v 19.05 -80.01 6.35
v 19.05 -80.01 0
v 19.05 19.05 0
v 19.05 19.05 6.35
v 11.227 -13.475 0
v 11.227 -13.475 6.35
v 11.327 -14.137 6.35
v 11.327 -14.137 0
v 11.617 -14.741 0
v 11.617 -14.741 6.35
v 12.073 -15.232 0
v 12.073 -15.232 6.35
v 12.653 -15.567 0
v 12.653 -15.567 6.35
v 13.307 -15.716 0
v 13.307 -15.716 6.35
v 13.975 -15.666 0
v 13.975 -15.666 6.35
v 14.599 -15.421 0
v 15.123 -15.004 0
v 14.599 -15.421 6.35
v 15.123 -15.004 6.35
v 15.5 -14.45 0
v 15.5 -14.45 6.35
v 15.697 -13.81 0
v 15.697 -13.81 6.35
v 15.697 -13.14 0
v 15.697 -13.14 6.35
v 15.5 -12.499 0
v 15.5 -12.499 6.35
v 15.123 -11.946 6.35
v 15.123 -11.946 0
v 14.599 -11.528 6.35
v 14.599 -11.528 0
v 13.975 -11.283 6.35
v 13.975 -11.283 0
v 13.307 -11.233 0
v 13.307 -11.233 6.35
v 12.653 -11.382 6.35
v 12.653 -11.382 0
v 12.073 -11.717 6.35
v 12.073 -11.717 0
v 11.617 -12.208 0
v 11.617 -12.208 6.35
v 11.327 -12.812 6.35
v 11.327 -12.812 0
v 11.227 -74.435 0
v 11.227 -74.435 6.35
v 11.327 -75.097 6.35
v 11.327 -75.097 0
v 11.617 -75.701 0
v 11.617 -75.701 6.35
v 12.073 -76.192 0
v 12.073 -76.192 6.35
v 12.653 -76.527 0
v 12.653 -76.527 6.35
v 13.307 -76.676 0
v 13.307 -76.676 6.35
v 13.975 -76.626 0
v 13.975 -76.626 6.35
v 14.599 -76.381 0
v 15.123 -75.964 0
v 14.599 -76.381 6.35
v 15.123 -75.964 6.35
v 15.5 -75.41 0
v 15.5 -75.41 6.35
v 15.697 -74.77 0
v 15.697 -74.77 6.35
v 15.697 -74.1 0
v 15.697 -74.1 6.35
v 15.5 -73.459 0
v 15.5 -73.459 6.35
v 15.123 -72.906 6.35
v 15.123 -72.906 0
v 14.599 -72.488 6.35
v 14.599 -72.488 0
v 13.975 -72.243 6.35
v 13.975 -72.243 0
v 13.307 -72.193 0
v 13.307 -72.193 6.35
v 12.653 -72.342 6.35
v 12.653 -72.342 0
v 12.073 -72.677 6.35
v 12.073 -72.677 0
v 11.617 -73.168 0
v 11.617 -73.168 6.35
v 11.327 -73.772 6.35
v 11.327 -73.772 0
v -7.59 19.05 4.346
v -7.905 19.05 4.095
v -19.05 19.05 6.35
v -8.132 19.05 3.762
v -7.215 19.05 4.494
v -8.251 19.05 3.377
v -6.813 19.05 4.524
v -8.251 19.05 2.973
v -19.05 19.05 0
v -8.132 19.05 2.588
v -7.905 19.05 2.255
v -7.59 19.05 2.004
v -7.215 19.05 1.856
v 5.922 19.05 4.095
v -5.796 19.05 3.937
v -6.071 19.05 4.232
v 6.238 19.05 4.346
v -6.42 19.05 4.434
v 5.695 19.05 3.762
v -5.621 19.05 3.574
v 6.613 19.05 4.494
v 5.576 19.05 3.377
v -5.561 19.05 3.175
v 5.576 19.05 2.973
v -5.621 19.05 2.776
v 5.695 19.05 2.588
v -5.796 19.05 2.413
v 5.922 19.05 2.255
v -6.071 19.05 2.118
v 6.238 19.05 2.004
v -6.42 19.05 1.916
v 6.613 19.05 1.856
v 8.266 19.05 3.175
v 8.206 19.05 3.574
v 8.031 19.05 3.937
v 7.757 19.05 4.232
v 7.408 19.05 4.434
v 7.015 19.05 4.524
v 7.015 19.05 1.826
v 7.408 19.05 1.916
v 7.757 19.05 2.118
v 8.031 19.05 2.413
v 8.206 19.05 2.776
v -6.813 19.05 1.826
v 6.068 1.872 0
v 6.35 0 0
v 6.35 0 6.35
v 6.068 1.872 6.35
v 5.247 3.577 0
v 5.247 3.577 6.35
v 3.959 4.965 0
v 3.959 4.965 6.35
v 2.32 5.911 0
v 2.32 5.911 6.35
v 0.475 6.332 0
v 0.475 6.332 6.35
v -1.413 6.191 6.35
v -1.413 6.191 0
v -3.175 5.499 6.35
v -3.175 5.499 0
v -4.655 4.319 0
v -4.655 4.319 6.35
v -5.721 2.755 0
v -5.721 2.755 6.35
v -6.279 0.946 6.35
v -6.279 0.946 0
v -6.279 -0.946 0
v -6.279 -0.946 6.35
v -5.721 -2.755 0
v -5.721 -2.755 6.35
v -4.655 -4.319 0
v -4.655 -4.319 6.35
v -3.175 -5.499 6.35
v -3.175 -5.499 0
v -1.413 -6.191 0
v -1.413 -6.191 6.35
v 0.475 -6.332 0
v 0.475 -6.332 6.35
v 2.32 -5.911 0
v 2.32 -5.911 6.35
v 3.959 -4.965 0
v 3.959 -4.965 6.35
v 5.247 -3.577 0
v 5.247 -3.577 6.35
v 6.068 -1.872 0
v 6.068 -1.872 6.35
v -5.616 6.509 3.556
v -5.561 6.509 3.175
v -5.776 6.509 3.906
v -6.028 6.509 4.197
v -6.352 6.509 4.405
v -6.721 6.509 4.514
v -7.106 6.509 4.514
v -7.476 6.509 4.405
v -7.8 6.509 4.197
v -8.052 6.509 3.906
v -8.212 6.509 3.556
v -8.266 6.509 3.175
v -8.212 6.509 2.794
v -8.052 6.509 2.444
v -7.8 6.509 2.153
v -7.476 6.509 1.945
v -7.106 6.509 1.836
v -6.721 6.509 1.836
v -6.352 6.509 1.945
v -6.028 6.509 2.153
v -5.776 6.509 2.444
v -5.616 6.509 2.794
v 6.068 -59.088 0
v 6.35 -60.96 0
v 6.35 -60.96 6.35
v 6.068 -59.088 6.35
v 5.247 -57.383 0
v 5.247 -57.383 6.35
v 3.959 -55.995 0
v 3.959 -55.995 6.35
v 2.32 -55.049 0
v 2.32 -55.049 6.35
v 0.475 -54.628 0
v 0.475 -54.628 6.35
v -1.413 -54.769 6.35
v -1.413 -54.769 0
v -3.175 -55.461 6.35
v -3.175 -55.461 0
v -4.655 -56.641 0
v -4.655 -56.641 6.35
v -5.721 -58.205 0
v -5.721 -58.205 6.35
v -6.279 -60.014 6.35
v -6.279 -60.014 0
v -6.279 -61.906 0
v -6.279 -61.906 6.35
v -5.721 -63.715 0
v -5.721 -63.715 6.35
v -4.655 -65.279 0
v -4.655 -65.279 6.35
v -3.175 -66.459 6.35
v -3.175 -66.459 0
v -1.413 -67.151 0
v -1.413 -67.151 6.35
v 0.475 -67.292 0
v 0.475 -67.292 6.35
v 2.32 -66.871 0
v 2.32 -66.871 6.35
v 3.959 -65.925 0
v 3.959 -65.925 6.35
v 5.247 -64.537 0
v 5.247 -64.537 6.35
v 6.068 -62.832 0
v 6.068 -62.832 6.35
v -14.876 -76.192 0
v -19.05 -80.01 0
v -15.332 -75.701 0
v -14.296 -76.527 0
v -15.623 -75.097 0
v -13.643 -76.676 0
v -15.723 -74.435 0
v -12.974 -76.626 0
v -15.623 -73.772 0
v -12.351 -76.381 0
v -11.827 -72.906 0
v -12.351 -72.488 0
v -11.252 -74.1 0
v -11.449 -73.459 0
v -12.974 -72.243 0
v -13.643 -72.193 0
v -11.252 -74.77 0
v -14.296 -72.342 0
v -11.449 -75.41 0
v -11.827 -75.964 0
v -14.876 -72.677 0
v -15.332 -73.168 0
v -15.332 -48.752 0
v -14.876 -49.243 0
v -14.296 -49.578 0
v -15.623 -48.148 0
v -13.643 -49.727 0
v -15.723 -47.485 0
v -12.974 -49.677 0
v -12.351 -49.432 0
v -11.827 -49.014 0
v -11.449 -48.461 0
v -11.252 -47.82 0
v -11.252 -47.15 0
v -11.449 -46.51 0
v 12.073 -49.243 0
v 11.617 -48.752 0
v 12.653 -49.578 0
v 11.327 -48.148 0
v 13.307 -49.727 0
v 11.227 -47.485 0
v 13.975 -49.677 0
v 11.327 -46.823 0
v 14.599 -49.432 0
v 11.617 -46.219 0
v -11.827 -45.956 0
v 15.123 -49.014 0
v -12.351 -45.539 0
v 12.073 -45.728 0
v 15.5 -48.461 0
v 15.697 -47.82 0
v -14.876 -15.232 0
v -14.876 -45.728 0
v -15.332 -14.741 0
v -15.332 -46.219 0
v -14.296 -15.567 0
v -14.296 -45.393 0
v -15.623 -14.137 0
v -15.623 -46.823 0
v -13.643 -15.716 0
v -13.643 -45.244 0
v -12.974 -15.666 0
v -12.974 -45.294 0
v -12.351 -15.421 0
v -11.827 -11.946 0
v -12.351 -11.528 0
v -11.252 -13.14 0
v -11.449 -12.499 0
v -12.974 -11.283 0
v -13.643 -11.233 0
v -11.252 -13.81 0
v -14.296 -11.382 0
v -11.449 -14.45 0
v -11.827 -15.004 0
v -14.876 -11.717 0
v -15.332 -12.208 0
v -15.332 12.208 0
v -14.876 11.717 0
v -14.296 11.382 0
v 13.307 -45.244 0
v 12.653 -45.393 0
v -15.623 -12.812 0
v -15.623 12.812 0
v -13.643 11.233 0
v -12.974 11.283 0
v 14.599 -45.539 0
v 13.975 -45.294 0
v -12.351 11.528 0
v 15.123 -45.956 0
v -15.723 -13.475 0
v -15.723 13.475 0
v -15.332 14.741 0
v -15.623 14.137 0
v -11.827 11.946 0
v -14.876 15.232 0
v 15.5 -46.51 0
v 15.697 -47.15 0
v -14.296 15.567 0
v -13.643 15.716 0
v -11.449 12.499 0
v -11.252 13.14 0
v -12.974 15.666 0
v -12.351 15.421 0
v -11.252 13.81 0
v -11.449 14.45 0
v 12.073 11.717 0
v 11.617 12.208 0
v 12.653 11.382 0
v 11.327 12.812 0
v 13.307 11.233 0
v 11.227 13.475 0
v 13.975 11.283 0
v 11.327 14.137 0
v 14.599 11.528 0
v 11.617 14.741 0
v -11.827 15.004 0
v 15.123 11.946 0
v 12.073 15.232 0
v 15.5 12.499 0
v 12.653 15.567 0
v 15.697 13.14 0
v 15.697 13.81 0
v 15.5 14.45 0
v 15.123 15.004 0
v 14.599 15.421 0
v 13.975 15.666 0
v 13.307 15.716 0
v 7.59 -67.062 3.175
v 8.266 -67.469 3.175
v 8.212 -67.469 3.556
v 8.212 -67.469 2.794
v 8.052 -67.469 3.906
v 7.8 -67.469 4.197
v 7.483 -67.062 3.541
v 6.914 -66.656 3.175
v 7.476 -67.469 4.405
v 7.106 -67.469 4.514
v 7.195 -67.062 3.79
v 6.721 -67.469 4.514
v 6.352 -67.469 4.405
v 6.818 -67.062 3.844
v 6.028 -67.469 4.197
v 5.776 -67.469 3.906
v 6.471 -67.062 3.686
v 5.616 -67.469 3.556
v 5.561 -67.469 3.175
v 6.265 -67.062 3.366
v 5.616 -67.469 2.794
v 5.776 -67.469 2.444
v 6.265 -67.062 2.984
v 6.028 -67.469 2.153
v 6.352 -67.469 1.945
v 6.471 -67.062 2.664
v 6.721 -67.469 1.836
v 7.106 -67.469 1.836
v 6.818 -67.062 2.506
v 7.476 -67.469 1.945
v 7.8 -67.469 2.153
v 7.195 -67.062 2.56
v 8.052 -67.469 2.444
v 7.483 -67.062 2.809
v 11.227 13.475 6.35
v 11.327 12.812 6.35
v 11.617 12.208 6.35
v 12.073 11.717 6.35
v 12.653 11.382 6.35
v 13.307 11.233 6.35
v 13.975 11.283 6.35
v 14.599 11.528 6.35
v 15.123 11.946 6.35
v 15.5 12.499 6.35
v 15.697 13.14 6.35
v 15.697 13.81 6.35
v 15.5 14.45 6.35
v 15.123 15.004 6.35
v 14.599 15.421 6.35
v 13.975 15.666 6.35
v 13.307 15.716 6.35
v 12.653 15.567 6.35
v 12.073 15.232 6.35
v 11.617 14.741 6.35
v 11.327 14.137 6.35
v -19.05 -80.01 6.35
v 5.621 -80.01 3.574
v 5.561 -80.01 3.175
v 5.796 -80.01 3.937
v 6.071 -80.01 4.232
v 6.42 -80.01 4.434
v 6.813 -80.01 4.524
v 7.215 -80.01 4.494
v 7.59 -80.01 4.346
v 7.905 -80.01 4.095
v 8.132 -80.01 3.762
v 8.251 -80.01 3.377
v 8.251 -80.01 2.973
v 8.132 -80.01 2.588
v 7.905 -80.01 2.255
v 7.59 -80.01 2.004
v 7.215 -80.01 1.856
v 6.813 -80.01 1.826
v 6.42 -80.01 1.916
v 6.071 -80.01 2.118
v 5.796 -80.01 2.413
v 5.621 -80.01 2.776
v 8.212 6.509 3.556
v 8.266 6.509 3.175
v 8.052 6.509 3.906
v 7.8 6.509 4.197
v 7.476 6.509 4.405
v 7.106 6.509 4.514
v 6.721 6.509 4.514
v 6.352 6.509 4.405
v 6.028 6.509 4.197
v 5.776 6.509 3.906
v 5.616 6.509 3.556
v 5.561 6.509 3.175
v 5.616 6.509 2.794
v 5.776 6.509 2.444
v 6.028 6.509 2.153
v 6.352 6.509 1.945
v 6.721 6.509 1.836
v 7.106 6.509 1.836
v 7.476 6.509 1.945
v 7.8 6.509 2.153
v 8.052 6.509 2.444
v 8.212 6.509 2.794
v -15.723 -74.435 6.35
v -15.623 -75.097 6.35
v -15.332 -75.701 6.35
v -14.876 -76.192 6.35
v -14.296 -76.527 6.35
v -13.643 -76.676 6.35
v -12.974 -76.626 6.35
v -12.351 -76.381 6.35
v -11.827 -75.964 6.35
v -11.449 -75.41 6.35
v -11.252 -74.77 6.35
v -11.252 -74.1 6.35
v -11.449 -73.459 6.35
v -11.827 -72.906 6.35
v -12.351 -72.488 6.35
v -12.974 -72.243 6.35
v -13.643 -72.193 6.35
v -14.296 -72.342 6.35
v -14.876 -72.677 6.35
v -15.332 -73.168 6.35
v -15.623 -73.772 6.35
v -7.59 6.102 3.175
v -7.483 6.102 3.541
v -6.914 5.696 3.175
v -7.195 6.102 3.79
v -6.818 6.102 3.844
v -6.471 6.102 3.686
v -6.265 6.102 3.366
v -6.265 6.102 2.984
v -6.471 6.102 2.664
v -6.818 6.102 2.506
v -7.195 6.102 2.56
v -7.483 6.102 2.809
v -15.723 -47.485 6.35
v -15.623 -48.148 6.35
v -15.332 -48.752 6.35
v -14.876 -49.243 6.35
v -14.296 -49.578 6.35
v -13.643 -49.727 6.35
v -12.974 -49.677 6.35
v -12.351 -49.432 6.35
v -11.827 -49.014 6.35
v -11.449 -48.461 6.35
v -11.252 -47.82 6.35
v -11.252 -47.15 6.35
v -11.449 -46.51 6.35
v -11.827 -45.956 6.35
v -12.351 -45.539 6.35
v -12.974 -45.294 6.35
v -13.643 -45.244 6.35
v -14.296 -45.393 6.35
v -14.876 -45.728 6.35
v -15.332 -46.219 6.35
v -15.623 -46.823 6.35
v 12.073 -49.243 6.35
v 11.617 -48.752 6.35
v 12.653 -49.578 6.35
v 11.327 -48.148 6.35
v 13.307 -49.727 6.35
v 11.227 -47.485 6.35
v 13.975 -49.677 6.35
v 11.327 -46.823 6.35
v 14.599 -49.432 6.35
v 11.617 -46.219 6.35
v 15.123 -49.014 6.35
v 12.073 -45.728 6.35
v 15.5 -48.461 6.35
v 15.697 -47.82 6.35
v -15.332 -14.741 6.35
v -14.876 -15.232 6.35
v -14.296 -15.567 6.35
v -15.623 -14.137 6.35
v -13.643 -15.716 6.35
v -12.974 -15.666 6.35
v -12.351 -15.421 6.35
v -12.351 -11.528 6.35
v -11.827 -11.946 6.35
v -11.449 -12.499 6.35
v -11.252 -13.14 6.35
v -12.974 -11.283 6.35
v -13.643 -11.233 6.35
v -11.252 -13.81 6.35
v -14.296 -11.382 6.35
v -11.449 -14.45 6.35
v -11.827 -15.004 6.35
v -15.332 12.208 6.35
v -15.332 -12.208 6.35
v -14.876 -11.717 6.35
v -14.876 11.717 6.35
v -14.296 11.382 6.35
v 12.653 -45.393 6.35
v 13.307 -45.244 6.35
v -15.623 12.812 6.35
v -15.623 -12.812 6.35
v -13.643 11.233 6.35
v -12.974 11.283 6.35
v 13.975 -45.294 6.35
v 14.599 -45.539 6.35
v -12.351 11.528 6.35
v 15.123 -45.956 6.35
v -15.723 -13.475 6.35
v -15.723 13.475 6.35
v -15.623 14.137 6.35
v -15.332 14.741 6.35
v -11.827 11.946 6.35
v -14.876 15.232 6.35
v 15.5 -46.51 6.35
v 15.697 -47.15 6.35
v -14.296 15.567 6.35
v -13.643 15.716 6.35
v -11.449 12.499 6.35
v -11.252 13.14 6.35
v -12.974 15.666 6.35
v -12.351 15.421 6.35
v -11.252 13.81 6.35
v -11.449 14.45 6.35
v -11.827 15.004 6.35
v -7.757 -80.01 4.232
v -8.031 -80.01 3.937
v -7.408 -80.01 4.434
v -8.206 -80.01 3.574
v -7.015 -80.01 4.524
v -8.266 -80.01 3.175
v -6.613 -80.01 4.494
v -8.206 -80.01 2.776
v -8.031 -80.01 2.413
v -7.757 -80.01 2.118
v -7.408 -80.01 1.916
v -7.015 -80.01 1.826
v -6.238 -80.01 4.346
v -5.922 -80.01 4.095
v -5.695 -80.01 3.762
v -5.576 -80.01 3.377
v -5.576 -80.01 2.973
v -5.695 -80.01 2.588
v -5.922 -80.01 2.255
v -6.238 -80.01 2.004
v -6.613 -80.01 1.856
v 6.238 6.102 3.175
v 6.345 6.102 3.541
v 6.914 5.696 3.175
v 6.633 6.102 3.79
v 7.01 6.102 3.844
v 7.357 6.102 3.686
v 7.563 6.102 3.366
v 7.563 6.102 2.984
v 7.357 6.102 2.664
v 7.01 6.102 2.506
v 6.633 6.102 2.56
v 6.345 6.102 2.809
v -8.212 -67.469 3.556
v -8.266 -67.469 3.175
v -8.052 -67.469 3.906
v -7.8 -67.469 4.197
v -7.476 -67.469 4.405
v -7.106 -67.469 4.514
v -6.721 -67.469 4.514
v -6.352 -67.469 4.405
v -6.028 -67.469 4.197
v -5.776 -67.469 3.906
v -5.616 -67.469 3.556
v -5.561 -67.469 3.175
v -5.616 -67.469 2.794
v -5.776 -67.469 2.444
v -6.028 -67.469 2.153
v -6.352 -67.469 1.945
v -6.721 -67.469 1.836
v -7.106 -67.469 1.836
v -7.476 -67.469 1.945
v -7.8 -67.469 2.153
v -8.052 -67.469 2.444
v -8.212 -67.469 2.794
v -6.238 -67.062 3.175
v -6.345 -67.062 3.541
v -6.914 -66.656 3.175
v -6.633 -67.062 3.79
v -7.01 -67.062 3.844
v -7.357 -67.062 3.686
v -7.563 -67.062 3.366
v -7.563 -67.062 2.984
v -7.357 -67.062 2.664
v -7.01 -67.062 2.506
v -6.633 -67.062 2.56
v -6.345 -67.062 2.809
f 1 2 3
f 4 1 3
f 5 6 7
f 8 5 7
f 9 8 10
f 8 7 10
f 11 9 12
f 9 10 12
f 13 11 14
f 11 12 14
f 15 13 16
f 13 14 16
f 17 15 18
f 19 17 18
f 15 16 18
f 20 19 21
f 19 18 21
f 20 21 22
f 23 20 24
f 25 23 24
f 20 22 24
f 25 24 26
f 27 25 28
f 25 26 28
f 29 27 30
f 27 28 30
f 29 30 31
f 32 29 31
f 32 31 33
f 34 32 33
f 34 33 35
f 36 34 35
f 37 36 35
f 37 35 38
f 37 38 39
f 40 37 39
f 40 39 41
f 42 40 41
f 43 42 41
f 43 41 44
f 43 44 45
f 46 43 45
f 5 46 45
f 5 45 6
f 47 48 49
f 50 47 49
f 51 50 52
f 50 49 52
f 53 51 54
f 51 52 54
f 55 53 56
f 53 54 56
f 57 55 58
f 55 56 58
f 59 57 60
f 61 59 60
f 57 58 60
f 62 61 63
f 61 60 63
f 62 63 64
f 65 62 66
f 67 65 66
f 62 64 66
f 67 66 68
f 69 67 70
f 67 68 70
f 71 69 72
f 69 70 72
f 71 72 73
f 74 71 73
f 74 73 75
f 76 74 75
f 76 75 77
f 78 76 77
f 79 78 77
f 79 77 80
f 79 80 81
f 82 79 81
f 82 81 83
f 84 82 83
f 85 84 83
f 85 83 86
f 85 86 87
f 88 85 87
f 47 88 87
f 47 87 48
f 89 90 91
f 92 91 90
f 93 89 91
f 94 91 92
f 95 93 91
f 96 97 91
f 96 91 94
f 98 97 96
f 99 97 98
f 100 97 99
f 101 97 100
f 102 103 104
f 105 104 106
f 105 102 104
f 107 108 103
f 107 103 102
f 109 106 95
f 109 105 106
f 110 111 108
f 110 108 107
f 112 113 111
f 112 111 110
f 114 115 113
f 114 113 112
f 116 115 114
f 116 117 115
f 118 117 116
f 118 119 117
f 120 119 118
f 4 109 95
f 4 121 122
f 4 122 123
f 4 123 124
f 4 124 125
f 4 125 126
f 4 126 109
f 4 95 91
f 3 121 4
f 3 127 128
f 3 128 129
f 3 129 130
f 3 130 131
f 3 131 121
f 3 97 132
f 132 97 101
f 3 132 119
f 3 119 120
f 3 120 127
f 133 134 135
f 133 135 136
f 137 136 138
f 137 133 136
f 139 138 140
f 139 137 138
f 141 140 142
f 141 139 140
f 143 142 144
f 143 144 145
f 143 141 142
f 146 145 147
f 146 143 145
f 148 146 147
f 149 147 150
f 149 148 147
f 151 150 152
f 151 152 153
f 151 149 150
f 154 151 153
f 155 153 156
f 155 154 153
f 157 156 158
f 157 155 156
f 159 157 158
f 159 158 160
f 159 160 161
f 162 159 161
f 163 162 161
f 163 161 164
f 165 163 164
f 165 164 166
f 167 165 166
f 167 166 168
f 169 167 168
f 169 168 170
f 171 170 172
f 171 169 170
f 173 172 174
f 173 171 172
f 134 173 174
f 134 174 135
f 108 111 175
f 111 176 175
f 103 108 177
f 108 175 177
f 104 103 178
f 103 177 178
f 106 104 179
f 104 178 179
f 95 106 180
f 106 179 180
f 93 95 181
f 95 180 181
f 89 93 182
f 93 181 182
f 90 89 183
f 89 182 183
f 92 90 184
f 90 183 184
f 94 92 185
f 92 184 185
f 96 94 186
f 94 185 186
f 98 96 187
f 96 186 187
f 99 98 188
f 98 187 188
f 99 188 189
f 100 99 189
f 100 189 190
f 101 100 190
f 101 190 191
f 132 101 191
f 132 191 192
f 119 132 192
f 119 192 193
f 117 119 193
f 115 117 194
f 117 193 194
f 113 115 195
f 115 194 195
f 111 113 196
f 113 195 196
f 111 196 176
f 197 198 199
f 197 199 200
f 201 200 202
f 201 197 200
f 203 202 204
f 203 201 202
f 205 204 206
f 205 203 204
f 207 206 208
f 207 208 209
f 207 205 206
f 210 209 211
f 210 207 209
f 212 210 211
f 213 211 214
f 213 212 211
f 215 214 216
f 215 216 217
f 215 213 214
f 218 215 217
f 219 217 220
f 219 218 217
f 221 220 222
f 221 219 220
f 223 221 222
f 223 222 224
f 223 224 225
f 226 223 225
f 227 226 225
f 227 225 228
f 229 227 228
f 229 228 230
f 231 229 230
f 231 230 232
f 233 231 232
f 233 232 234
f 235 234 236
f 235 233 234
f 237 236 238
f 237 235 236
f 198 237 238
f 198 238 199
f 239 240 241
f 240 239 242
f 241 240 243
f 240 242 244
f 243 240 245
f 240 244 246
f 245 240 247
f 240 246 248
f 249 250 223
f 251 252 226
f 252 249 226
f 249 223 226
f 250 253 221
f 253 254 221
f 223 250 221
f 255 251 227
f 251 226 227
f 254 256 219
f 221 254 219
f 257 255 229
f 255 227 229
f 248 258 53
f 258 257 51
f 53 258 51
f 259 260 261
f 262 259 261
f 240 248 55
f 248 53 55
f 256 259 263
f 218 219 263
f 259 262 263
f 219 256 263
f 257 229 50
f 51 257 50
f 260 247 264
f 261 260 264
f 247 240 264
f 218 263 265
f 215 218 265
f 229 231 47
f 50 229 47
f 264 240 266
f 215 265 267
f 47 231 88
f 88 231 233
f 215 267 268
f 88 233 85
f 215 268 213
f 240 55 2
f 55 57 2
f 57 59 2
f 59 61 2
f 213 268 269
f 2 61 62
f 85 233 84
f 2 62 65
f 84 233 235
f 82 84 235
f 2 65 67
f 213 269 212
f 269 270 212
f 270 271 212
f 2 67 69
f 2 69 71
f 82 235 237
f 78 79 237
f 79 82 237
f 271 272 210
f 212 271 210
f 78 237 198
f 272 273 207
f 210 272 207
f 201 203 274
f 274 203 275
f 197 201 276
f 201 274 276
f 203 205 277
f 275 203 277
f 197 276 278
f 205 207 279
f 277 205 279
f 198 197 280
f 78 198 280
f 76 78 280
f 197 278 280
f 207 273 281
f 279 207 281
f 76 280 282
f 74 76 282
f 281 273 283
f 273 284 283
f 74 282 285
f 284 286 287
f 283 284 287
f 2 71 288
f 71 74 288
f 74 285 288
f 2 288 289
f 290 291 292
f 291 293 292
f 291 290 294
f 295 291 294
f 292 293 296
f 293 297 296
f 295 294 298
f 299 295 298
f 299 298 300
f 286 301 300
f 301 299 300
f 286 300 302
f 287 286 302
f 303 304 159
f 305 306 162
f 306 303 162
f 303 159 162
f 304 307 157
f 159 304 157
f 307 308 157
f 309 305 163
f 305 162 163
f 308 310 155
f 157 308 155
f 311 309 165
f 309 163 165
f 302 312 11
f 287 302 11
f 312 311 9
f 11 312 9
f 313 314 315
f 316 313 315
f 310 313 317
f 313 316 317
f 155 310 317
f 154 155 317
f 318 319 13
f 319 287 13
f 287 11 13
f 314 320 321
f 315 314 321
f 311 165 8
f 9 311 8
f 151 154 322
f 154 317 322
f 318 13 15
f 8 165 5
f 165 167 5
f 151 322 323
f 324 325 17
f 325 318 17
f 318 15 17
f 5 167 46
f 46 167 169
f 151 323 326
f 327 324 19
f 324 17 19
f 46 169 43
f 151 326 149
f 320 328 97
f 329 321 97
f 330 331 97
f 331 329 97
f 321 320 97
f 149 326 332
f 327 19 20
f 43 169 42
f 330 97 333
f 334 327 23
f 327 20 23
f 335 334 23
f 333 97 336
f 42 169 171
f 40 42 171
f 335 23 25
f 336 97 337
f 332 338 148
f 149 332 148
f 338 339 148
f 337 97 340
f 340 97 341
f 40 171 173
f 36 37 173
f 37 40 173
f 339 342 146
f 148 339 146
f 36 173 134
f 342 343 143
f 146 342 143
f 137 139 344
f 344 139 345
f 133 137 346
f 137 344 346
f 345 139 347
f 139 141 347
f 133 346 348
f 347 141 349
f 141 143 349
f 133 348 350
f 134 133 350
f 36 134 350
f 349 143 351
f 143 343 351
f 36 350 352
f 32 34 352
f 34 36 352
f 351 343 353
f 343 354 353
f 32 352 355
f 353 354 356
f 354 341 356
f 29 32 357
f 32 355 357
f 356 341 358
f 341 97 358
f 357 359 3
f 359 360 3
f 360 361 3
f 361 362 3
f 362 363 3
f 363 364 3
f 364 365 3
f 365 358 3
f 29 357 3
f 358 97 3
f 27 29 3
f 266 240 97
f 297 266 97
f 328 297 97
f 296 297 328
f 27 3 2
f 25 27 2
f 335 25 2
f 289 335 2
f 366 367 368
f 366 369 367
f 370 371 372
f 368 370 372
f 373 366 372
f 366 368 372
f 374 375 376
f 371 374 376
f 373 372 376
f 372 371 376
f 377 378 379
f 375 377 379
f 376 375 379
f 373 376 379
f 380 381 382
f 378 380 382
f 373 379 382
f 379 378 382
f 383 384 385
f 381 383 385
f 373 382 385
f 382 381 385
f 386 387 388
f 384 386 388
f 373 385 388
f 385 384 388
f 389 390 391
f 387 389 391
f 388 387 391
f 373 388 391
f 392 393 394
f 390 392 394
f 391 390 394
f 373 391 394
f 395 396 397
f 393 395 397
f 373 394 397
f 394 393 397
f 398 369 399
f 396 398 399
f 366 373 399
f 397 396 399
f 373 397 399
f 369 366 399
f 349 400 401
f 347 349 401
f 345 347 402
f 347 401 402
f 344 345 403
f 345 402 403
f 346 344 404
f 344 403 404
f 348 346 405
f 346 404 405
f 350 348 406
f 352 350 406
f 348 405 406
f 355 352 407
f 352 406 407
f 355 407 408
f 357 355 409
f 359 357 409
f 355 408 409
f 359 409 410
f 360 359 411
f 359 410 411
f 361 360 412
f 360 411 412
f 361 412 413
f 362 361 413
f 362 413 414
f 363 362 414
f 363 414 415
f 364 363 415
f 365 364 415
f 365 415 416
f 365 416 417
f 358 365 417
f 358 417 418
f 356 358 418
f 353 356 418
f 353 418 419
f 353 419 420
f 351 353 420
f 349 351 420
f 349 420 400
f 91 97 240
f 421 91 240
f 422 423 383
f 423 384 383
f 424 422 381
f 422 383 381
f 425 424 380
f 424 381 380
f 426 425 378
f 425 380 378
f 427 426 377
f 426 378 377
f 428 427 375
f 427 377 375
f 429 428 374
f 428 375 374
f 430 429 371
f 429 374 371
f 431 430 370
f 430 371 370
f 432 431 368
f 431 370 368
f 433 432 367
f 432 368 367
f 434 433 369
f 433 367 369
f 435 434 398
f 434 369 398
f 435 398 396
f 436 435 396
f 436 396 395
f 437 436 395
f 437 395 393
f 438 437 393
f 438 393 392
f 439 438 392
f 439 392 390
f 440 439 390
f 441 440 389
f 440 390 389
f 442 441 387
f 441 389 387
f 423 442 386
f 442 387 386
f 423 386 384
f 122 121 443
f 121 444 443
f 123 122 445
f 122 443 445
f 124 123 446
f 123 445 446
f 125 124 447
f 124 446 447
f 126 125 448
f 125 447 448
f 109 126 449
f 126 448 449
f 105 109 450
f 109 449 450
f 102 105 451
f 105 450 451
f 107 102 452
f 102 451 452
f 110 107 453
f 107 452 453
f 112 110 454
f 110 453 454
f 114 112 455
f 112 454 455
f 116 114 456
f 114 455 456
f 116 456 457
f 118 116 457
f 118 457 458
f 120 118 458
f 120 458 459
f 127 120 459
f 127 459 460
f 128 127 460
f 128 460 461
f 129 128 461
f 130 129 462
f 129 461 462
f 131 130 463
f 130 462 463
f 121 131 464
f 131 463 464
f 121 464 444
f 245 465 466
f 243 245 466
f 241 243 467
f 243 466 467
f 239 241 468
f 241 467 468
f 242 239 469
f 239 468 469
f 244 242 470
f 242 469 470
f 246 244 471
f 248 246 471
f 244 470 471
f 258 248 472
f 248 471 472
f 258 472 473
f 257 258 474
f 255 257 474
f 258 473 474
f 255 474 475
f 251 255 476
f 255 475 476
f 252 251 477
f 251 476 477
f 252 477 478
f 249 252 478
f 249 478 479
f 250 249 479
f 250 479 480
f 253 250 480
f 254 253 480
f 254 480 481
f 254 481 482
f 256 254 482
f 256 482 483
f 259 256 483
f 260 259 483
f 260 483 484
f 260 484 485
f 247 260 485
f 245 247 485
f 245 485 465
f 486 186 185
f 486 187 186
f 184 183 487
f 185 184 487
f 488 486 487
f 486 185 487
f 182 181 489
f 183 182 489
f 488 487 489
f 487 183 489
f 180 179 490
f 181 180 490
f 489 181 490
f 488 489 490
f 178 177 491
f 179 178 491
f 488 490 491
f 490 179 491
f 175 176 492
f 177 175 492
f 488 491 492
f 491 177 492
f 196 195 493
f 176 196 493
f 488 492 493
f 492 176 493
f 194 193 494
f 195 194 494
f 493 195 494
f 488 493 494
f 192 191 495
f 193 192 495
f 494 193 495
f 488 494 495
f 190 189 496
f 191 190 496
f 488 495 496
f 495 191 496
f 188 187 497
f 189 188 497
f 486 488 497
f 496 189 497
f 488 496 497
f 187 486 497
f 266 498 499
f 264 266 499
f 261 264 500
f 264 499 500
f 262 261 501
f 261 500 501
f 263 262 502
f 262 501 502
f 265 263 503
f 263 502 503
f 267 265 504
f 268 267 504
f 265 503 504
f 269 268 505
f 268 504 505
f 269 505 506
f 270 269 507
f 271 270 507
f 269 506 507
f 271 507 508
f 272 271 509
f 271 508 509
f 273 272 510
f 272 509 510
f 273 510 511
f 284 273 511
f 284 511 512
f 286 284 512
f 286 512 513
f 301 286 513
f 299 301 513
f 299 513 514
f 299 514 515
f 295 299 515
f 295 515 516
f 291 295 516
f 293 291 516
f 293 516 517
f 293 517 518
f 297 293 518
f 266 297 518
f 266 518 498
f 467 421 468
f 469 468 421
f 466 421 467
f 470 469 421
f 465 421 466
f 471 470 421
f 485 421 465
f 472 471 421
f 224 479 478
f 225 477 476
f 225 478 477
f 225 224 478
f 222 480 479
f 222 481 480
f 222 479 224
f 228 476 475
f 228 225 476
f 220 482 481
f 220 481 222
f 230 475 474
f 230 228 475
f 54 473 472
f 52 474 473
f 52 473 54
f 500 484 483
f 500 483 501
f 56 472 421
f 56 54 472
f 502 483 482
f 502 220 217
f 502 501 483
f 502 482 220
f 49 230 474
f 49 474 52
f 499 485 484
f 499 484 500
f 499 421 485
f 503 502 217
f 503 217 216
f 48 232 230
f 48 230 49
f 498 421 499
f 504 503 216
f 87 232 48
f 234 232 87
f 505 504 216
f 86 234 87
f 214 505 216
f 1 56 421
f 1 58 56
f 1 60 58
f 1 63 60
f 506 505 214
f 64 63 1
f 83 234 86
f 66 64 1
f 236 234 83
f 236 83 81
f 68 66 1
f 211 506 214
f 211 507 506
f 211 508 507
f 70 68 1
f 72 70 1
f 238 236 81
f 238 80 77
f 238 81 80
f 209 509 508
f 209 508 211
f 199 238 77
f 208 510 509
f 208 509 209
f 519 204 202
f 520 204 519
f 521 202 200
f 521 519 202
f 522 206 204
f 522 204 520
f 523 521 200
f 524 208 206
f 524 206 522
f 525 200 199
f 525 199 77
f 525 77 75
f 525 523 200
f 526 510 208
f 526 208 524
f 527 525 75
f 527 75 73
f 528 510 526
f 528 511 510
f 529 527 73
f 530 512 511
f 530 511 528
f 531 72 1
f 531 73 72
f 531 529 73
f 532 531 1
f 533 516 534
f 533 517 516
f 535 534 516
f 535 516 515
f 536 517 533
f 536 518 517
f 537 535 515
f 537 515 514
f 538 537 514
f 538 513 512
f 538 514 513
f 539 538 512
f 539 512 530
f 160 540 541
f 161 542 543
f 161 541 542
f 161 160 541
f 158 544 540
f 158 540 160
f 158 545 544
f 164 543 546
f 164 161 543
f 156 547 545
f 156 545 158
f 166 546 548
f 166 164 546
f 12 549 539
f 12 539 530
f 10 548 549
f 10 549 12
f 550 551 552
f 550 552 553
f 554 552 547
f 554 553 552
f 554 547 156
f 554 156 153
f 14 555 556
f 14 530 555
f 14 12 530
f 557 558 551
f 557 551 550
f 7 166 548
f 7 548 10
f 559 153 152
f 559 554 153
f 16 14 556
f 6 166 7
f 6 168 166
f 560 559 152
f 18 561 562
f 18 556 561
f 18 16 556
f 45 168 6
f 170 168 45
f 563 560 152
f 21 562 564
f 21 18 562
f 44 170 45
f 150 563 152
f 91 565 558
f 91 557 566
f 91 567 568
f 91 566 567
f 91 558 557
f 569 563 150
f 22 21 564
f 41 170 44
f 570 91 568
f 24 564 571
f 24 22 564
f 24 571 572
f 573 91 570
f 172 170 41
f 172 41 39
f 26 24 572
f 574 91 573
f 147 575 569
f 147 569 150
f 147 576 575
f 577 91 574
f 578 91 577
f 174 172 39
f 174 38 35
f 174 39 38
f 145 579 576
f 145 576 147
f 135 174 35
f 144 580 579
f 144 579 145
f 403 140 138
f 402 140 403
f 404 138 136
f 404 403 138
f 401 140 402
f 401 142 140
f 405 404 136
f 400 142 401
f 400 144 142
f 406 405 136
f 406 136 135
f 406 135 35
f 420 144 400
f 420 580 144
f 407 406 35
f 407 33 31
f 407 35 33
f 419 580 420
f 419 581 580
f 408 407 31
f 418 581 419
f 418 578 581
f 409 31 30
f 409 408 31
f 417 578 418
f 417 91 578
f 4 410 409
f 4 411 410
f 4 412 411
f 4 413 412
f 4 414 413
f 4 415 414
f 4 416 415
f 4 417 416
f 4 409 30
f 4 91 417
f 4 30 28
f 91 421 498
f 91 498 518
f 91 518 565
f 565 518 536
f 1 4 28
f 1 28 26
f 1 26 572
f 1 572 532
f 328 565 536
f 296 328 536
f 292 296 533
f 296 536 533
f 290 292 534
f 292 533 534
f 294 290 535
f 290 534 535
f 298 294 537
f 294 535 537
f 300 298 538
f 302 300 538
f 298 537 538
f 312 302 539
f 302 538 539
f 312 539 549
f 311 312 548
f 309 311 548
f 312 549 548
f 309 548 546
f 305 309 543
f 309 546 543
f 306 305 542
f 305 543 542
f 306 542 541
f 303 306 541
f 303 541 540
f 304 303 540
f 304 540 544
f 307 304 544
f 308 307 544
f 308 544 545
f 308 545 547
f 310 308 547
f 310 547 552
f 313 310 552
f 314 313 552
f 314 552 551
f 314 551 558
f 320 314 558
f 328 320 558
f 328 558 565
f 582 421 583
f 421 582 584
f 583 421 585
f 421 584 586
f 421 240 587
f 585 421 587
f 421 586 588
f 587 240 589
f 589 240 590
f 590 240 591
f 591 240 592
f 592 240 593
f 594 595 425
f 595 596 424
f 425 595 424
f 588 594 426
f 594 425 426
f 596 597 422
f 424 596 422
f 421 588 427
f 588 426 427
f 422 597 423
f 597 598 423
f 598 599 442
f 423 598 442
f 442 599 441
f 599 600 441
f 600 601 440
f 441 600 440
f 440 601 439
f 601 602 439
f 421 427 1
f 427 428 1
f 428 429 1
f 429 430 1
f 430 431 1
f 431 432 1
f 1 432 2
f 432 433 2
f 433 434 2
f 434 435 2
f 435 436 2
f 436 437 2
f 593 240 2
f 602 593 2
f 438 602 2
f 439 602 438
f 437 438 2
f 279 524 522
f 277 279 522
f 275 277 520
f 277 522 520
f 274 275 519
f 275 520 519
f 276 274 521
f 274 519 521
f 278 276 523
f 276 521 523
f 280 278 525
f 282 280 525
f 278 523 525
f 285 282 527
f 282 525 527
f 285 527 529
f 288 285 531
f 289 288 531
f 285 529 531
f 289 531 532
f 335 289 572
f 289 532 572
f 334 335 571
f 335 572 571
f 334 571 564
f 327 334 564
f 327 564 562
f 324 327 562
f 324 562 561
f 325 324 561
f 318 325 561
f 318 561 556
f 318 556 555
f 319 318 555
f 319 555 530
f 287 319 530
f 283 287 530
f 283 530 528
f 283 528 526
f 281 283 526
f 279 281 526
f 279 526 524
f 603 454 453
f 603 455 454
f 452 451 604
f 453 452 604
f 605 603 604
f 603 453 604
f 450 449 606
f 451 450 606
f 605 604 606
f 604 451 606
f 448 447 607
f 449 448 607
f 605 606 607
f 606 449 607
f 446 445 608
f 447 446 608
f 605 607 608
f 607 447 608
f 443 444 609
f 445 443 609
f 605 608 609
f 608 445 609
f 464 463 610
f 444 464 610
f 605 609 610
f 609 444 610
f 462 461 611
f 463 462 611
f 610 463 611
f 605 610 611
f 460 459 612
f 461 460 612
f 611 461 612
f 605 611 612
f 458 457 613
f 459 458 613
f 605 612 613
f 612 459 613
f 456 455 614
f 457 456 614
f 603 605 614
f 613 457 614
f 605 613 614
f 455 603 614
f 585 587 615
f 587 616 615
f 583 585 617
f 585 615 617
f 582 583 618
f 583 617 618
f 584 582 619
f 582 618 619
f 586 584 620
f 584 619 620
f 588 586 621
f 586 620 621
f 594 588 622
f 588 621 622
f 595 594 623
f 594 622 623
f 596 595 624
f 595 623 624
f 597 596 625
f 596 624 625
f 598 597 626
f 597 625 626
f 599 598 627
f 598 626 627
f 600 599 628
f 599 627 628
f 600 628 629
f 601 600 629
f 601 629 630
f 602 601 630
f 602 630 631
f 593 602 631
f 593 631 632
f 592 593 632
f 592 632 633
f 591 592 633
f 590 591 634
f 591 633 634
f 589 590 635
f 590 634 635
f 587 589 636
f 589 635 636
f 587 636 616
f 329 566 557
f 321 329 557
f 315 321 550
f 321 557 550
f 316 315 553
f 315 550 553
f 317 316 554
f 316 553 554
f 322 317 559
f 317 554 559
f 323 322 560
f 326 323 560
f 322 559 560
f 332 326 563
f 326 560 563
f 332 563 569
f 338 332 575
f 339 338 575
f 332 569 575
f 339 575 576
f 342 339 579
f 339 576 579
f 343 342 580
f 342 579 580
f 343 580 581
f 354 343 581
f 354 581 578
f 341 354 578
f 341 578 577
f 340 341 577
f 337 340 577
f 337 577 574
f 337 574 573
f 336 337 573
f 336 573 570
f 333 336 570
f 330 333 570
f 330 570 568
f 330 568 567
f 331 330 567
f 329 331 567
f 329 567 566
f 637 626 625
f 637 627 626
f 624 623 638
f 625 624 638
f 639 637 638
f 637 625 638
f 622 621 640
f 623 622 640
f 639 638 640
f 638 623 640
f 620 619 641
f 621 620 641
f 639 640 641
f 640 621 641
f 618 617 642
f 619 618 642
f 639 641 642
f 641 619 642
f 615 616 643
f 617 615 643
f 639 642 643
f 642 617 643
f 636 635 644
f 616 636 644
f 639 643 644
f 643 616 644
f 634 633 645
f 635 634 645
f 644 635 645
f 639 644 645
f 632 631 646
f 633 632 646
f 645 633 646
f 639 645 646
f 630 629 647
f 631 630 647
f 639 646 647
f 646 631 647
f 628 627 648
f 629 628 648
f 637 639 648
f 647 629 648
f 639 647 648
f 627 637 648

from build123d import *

# Parameters (mm, degrees)
F0_W           = 38.1
F0_H           = 38.1
F0_R           = 6.35
F0_H_2         = 22.86
F1_DEPTH       = 6.35
F2_D           = 4.4958
F5_D           = 2.7051
F5_DEPTH       = 12.54125
F5_TIP         = 0.8126940303
F5_ON_F3_D     = 2.7051
F5_ON_F3_DEPTH = 12.54125
F5_ON_F3_TIP   = 0.8126940303


with BuildPart() as f1:
    # F0 (on Top) → F1 (new body)
    with BuildSketch(Plane.XY):
        Rectangle(F0_W, F0_H)
        Circle(F0_R, mode=Mode.SUBTRACT)
        with Locations((0, -30.48)):
            Rectangle(F0_W, F0_H_2)
        with Locations((0, -60.96)):
            Rectangle(F0_W, F0_H)
        with Locations((0, -60.96)):
            Circle(F0_R, mode=Mode.SUBTRACT)
    extrude(amount=F1_DEPTH)

    # F2 (through all)
    with Locations(Plane(origin=(0, 0, 0), x_dir=(1, 0, 0), z_dir=(0, 0, -1))):
        with Locations((-13.4747, -13.4747), (13.4747, -13.4747), (13.4747, 13.4747), (-13.4747, 13.4747), (-13.4747, 47.4853), (13.4747, 47.4853), (13.4747, 74.4347), (-13.4747, 74.4347)):
            Hole(F2_D / 2)

    # F5
    with Locations(Plane(origin=(0, 19.05, 0), x_dir=(-1, 0, 0), z_dir=(0, 1, 0))):
        with Locations((-6.91388, 3.175), (6.91388, 3.175)):
            Hole(F5_D / 2, depth=F5_DEPTH)
            with Locations((0, 0, -(F5_DEPTH + F5_TIP / 2))):  # 118° drill point
                Cone(0, F5_D / 2, F5_TIP, mode=Mode.SUBTRACT)

    # F5 on F3
    with Locations(Plane.XZ.offset(80.01)):
        with Locations((6.91388, 3.175), (-6.91388, 3.175)):
            Hole(F5_ON_F3_D / 2, depth=F5_ON_F3_DEPTH)
            with Locations((0, 0, -(F5_ON_F3_DEPTH + F5_ON_F3_TIP / 2))):  # 118° drill point
                Cone(0, F5_ON_F3_D / 2, F5_ON_F3_TIP, mode=Mode.SUBTRACT)


solid = f1.part
